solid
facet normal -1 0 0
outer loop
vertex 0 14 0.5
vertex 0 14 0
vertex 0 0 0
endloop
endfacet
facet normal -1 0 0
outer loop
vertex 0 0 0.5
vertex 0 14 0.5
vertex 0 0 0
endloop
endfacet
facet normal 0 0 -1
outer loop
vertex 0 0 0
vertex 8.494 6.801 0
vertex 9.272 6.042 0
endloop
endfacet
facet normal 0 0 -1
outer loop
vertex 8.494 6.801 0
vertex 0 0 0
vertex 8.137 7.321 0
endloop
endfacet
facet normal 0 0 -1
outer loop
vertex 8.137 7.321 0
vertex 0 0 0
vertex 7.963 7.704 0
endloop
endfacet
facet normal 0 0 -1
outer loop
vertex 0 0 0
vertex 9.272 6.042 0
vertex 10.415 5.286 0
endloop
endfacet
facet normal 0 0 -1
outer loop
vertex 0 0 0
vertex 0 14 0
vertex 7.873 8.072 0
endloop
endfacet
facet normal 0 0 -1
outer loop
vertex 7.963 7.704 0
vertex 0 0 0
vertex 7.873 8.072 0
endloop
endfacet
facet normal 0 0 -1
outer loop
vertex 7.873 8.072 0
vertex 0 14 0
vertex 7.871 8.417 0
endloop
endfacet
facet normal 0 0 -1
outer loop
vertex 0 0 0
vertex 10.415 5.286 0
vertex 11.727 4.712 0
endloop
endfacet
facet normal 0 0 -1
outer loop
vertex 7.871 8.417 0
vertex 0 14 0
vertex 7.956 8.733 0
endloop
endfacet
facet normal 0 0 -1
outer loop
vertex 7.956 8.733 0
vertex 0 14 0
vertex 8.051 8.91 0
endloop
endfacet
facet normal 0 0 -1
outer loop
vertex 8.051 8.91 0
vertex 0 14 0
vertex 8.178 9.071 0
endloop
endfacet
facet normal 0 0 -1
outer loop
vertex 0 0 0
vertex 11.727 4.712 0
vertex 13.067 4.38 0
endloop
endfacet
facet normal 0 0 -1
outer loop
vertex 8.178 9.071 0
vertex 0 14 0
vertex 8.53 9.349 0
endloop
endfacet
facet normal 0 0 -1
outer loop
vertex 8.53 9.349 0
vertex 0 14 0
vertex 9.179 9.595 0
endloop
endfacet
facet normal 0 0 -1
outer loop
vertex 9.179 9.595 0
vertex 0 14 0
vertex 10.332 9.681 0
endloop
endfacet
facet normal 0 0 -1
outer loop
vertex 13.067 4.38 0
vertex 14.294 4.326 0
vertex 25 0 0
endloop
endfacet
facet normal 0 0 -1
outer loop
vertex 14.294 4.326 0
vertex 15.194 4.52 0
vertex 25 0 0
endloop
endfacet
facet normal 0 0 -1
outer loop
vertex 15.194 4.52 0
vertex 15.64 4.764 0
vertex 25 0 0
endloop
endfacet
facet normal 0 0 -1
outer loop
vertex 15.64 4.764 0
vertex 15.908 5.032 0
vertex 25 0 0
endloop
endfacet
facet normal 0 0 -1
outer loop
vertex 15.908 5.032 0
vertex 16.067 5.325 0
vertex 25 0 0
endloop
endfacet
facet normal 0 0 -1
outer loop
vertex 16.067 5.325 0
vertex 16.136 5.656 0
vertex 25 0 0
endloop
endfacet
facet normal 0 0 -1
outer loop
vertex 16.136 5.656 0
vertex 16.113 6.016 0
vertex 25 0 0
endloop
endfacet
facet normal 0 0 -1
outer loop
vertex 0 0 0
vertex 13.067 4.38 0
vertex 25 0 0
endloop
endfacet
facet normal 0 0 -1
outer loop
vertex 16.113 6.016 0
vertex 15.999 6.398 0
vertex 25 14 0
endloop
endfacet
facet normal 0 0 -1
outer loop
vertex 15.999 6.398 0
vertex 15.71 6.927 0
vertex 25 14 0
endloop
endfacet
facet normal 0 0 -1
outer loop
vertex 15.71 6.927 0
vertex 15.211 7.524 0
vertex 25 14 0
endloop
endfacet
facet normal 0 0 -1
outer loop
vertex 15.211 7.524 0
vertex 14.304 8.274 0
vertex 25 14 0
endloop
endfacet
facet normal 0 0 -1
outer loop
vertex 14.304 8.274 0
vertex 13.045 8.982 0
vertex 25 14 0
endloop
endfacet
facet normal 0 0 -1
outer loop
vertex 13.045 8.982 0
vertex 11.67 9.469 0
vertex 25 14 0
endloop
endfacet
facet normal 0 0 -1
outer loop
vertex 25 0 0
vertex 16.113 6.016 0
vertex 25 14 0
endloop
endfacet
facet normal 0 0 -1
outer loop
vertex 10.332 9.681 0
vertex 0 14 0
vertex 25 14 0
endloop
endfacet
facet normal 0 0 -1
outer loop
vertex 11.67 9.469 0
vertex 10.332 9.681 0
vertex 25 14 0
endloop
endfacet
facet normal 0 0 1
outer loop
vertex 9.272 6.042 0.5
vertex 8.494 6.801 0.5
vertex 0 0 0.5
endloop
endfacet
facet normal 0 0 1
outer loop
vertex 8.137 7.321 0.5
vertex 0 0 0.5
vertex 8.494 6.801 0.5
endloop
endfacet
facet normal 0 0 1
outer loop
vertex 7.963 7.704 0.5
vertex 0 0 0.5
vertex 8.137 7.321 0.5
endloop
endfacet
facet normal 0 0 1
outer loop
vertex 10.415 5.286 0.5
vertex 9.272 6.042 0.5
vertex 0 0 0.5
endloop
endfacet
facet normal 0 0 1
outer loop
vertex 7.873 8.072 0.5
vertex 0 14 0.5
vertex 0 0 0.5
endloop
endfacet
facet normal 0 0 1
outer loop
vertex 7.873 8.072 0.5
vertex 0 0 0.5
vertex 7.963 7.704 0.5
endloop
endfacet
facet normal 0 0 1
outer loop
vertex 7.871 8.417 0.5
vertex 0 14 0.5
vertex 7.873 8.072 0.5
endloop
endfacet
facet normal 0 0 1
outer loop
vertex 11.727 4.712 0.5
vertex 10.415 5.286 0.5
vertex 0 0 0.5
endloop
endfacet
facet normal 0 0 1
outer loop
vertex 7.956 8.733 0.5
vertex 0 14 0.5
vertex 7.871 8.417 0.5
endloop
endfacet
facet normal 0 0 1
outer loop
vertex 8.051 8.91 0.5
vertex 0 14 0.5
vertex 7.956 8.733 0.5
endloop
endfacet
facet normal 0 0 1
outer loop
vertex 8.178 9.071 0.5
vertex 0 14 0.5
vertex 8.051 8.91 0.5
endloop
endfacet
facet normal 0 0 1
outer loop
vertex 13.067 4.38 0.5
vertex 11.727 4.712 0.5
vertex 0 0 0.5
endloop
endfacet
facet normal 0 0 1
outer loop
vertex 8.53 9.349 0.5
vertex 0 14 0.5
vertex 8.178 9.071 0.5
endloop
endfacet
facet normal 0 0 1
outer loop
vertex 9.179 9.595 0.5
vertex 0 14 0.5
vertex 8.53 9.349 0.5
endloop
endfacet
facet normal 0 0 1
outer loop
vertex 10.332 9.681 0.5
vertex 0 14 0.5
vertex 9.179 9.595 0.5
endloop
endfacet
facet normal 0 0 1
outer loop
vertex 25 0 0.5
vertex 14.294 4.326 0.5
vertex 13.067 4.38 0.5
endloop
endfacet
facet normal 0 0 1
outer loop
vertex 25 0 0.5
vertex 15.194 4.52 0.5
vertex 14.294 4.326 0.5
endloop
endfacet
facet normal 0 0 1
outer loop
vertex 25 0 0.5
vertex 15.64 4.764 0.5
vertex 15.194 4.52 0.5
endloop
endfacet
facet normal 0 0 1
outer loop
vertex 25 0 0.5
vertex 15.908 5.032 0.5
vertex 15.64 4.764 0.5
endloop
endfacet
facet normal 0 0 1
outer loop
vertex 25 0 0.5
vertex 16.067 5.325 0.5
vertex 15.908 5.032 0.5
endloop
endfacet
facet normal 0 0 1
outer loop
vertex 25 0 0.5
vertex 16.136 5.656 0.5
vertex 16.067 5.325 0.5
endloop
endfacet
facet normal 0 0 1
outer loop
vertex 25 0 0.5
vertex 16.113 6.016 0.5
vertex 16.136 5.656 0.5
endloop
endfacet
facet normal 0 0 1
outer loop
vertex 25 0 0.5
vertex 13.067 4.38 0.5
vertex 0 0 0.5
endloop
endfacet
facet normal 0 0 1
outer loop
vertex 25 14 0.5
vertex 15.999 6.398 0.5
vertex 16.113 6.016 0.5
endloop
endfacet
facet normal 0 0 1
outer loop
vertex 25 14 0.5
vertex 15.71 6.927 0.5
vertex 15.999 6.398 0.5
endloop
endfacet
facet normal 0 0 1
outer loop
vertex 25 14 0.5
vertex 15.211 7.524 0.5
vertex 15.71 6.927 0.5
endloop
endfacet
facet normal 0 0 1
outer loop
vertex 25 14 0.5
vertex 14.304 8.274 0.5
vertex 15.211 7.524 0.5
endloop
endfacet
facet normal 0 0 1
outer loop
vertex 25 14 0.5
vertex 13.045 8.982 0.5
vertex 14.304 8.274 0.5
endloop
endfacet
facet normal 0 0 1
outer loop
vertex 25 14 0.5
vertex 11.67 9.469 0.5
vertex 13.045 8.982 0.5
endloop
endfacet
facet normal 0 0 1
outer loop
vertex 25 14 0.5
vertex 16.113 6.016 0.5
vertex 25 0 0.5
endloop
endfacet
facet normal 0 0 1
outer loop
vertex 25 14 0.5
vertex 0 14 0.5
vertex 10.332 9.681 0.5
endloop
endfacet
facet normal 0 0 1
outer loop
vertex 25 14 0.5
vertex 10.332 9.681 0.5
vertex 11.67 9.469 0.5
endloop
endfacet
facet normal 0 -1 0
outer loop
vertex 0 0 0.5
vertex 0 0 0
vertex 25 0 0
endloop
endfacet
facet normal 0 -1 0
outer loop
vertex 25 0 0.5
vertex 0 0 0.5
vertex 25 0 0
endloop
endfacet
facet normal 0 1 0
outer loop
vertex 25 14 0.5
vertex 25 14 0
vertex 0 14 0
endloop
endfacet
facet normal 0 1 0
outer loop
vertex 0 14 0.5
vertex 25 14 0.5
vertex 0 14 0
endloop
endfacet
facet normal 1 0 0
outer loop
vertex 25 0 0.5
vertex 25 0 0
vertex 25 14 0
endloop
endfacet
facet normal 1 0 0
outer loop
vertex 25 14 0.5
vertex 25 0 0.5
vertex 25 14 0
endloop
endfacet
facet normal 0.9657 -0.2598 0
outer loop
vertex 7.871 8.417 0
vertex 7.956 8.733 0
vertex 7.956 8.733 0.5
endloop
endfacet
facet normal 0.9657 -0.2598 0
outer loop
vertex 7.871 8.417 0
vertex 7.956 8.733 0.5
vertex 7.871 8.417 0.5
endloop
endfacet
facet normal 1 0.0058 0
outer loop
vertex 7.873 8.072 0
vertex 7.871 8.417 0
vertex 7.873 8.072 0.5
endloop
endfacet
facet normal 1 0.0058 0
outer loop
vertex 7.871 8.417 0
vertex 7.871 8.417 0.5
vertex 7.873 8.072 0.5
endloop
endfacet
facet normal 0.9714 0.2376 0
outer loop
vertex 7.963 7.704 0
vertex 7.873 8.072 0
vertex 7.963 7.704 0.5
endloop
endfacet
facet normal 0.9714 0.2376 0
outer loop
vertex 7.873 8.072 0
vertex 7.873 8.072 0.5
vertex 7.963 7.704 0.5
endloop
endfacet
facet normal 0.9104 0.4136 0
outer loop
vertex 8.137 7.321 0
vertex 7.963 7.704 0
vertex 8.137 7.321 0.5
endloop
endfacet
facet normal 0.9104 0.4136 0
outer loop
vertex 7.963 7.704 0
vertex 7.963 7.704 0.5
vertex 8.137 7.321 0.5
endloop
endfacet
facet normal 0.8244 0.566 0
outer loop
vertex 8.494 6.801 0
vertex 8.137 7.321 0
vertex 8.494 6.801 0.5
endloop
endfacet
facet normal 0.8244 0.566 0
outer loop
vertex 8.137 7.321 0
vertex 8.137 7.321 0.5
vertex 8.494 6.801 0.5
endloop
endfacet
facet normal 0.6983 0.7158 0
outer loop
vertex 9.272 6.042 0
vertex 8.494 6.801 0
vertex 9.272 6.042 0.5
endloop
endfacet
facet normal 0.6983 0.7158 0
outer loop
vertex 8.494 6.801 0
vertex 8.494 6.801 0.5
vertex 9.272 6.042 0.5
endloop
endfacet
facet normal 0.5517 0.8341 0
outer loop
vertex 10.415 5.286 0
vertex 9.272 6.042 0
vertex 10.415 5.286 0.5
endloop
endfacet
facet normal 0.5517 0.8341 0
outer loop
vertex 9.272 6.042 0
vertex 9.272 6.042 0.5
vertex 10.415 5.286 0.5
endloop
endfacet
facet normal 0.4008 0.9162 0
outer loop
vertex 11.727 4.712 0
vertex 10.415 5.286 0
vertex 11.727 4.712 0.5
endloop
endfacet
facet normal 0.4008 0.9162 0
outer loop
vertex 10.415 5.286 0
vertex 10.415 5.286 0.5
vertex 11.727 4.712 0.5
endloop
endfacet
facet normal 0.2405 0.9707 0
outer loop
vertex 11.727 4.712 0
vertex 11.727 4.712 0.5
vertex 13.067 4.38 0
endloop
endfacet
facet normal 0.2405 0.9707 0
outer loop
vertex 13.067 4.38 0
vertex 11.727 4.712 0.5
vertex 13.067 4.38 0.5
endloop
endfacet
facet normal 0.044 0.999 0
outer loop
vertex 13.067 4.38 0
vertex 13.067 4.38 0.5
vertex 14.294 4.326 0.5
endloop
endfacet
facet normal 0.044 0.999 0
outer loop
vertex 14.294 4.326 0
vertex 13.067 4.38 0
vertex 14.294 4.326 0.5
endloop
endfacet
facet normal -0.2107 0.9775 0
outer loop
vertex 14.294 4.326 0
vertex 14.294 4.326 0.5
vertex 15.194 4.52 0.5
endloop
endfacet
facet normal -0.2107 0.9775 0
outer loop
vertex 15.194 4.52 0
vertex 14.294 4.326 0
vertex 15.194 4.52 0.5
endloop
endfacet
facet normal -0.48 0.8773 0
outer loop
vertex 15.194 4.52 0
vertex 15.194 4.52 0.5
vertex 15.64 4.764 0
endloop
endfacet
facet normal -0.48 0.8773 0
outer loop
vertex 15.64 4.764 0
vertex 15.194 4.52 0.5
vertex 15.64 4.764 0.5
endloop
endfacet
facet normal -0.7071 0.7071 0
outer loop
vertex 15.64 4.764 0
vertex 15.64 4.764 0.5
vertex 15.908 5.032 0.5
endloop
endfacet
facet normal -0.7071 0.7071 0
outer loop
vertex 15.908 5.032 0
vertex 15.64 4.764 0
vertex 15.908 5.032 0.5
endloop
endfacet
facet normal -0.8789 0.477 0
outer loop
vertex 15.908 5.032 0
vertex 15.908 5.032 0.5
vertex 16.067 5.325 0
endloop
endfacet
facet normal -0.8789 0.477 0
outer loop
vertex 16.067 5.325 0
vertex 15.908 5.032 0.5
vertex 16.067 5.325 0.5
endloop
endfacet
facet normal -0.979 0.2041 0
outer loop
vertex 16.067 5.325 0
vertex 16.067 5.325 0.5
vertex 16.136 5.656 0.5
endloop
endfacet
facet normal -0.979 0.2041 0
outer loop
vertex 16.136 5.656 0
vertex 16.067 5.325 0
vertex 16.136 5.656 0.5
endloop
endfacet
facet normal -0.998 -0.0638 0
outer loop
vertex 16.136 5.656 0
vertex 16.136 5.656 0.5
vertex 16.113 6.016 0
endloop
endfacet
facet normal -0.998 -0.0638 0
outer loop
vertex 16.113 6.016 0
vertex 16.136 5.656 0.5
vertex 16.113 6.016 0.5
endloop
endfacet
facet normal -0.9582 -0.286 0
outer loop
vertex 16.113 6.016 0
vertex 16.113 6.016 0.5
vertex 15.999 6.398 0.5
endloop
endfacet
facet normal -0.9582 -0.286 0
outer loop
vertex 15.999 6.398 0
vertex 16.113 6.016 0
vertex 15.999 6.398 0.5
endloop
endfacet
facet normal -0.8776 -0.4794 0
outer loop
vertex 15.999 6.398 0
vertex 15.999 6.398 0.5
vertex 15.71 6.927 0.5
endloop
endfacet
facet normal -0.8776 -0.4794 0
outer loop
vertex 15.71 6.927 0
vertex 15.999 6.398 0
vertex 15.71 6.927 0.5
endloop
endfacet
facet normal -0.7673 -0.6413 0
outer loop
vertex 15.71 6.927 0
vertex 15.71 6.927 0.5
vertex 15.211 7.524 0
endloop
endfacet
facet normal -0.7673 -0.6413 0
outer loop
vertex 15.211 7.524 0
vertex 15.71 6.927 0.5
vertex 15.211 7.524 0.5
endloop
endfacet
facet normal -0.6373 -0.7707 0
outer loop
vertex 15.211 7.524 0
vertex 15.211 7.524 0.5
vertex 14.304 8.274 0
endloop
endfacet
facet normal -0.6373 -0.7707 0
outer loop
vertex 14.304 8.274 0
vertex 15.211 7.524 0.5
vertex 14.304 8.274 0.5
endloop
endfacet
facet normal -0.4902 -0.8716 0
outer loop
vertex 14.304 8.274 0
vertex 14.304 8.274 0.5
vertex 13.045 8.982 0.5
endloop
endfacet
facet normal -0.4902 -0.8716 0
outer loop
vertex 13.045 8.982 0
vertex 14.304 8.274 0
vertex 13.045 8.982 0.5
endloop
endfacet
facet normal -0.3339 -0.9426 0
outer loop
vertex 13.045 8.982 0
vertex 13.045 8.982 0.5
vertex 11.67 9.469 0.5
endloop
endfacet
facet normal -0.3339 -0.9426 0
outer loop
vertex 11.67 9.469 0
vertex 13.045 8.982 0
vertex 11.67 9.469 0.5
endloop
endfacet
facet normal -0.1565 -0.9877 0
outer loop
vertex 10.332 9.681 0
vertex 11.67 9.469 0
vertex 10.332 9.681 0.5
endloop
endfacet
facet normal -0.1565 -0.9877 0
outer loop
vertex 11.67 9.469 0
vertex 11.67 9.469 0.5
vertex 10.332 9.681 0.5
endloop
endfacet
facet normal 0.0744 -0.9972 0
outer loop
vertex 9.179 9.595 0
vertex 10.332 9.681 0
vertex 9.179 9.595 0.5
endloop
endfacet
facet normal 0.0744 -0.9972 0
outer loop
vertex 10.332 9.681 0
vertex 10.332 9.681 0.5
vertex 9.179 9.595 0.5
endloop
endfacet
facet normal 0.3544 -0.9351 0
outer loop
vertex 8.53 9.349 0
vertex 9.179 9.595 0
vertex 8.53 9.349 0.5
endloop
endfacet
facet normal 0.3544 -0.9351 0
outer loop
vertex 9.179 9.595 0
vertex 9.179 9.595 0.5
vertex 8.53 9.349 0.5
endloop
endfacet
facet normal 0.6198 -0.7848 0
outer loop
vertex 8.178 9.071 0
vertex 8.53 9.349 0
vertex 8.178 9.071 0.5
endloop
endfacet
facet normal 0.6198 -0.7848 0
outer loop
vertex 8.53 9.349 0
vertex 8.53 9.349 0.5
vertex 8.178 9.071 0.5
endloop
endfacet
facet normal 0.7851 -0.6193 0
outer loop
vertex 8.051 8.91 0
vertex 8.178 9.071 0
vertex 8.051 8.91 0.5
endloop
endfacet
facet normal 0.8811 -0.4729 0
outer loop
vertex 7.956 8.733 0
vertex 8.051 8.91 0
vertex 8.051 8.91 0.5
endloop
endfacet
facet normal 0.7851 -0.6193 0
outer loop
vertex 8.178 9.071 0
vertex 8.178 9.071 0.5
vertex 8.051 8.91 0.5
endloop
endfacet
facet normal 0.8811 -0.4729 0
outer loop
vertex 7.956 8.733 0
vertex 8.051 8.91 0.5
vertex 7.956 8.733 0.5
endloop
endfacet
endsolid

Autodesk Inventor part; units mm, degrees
ref_plane "YZ Plane" through (0, 0, 0) normal (1, 0, 0) x (0, 1, 0)
ref_plane "XZ Plane" through (0, 0, 0) normal (0, 1, 0) x (-1, 0, 0)
ref_plane "XY Plane" through (0, 0, 0) normal (0, 0, 1) x (1, 0, 0)
sketch "Sketch2" plane through (0, 0, 0) normal (0, 0, 1) x (1, 0, 0)
  line L0 (0, 0) -> (25, 0)
  line L1 (25, 0) -> (25, 14)
  line L2 (25, 14) -> (0, 14)
  line L3 (0, 14) -> (0, 0)
extrude "Plate1" add sketch "Sketch2" along normal blind 0.5
sketch "Sketch3" plane through (0, 0, 0.5) normal (0, 0, 1) x (1, 0, 0)
  ellipse E0 centre (12, 7) end of major axis (7.9562, 8.7331) minor radius 2.2351
extrude "Cut1" cut sketch "Sketch3" against normal blind 0.5
equation "\"d5\" = Thickness"
equation "\"BendRadius\" = Thickness"
equation "\"BendReliefWidth\" = Thickness"
equation "\"BendReliefDepth\" = 0.5 * Thickness"
equation "\"CornerReliefSize\" = 4 * Thickness"
equation "\"MinimumRemnant\" = 2 * Thickness"
equation "\"TransitionRadius\" = BendRadius"
equation "\"JacobiRadiusSize\" = Thickness"
equation "\"GapSize\" = Thickness"
equation "\"d4\" = BendRadius"
equation "\"Thickness\" = 0.5"
properties part number "ThickThinProfile"
